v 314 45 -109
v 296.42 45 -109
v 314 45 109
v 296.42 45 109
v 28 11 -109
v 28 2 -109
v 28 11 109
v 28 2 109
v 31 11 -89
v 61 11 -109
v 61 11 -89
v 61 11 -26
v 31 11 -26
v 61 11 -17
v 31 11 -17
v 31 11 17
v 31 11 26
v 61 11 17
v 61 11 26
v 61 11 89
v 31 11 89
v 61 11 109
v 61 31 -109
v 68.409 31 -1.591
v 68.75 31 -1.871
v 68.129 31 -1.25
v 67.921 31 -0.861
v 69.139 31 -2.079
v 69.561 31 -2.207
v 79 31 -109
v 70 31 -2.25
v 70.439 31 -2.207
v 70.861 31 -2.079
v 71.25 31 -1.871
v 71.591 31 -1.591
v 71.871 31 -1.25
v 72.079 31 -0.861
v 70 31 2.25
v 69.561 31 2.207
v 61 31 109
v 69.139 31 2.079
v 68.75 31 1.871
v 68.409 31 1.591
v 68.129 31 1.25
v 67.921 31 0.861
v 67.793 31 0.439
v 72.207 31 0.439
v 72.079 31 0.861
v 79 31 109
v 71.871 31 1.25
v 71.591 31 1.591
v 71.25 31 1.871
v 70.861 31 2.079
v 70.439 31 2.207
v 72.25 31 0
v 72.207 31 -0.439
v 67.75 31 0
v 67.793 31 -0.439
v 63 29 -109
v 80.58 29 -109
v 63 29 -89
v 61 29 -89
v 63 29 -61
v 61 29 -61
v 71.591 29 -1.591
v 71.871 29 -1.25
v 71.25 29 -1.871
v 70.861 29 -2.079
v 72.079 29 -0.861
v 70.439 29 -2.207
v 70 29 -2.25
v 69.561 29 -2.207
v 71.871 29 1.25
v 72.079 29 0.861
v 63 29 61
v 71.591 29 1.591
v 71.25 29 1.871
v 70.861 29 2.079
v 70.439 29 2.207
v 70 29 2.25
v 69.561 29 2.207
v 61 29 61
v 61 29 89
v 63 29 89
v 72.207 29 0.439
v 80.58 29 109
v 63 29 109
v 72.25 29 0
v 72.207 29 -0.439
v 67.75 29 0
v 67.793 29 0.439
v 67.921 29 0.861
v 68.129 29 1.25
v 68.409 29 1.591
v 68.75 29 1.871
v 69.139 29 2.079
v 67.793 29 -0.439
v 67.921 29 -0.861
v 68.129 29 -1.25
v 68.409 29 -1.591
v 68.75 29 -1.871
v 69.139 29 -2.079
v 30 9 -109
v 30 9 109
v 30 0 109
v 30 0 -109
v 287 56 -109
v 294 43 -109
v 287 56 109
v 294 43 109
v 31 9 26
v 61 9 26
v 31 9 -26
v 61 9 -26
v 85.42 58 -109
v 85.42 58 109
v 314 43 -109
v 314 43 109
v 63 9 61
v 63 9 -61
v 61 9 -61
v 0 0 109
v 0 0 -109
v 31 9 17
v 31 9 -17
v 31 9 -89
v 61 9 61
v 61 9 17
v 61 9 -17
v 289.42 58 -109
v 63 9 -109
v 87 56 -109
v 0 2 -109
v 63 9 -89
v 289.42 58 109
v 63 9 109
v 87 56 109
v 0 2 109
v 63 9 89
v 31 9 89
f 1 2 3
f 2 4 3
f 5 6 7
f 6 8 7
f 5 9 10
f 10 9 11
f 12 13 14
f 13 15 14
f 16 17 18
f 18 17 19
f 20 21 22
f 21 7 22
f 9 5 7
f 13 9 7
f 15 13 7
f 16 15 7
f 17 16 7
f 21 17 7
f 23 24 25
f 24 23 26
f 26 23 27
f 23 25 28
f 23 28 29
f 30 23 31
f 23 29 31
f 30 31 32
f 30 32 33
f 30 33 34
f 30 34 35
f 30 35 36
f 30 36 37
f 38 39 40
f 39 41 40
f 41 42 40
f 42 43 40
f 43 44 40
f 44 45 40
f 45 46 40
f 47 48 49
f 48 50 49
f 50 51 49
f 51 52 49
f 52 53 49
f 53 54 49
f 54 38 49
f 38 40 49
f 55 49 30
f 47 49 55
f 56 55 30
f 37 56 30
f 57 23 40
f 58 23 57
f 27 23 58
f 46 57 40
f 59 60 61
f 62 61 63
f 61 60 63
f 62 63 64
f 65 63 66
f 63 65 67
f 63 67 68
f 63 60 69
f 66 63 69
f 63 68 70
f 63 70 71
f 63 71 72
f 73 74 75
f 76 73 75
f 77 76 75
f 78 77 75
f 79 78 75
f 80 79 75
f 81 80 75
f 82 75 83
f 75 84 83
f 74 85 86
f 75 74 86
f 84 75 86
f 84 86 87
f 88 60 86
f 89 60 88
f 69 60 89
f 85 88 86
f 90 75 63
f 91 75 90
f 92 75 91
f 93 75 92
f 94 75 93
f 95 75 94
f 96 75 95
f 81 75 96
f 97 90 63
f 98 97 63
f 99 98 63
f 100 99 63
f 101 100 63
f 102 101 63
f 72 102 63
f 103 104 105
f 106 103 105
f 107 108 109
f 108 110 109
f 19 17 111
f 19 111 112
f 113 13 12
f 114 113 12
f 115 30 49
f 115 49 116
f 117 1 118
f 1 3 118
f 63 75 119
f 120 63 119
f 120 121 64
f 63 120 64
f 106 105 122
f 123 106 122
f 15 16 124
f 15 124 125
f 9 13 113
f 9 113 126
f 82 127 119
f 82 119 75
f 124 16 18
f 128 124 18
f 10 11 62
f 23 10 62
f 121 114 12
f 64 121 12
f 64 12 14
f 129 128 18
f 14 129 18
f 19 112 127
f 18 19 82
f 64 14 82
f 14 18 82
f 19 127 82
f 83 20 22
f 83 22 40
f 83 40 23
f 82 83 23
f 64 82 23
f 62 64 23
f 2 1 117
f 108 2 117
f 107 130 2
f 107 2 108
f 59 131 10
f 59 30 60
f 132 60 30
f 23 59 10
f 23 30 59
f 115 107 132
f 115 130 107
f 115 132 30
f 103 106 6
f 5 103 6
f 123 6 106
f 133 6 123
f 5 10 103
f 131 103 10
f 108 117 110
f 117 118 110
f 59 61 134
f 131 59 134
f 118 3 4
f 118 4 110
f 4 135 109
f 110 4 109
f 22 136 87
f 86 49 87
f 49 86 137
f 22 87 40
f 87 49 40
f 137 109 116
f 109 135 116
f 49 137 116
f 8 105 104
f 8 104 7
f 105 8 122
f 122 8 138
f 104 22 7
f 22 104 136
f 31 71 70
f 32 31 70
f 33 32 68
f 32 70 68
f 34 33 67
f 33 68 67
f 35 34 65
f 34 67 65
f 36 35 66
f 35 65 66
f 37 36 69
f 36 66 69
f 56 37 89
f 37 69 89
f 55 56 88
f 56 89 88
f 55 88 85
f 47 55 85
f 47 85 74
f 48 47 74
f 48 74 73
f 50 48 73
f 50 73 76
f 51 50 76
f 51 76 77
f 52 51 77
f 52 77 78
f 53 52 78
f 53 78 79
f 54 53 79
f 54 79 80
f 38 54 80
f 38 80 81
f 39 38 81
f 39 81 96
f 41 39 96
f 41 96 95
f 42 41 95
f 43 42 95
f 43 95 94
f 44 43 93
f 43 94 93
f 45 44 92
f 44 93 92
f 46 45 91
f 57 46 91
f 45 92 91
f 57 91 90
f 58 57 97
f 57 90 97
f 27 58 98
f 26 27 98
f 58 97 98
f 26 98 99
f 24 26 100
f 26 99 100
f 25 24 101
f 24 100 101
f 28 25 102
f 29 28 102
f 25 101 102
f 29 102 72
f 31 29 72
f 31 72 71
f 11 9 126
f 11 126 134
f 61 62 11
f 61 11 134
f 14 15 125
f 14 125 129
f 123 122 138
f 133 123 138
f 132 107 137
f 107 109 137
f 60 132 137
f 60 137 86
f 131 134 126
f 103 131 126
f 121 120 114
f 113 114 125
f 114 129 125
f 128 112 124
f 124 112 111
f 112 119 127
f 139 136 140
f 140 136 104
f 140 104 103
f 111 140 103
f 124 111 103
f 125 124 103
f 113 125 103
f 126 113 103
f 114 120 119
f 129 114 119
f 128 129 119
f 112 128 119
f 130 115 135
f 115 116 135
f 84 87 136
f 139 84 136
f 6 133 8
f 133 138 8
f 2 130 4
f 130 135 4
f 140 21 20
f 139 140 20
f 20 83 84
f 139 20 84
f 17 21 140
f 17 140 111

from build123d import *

# Parameters (mm, degrees)
DODANIE_WYCI_GNI_CIE1_DEPTH = 109
SZKIC2_W                    = 30
SZKIC2_H                    = 63
SZKIC2_H_2                  = 34
WYTNIJ_WYCI_GNI_CIE1_DEPTH  = 2
OTW_R_POD_RUB_M41_D         = 4.5
OTW_R_POD_RUB_M41_DEPTH     = 2
SZKIC5_W                    = 28
SZKIC5_H                    = 20
WYTNIJ_WYCI_GNI_CIE2_DEPTH  = 3


with BuildPart() as part:
    # Szkic1 → Dodanie-wyciągnięcie1 (new body, symmetric)
    with BuildSketch(Plane.XY):
        Polygon((0, 0), (0, 2), (28, 2), (28, 11), (61, 11), (61, 31), (79, 31), (85.419782204, 58), (289.419782204, 58), (296.419782204, 45), (314, 45), (314, 43), (294, 43), (287, 56), (87, 56), (80.580217796, 29), (63, 29), (63, 9), (30, 9), (30, 0), align=None)
    extrude(amount=DODANIE_WYCI_GNI_CIE1_DEPTH, both=True)

    # Szkic2 → Wytnij-wyciągnięcie1 (cut)
    with BuildSketch(Plane(origin=(0, 11, 0), x_dir=(1, 0, 0), z_dir=(0, 1, 0))):
        with Locations((46, 57.5)):
            Rectangle(SZKIC2_W, SZKIC2_H)
        with Locations((46, 0)):
            Rectangle(SZKIC2_W, SZKIC2_H_2)
        with Locations((46, -57.5)):
            Rectangle(SZKIC2_W, SZKIC2_H)
    extrude(amount=-WYTNIJ_WYCI_GNI_CIE1_DEPTH, mode=Mode.SUBTRACT)

    # Otwór pod śrubę M41
    with Locations(Plane(origin=(70, 31, 0), x_dir=(0, 0, 1), z_dir=(0, 1, 0))):
        with Locations((0, 0)):
            Hole(OTW_R_POD_RUB_M41_D / 2, depth=OTW_R_POD_RUB_M41_DEPTH)

    # Szkic5 → Wytnij-wyciągnięcie2 (cut)
    with BuildSketch(Plane.ZY.offset(-61)):
        with Locations((-75, 19)):
            Rectangle(SZKIC5_W, SZKIC5_H)
        with Locations((75, 19)):
            Rectangle(SZKIC5_W, SZKIC5_H)
    extrude(amount=-WYTNIJ_WYCI_GNI_CIE2_DEPTH, mode=Mode.SUBTRACT)


solid = part.part
